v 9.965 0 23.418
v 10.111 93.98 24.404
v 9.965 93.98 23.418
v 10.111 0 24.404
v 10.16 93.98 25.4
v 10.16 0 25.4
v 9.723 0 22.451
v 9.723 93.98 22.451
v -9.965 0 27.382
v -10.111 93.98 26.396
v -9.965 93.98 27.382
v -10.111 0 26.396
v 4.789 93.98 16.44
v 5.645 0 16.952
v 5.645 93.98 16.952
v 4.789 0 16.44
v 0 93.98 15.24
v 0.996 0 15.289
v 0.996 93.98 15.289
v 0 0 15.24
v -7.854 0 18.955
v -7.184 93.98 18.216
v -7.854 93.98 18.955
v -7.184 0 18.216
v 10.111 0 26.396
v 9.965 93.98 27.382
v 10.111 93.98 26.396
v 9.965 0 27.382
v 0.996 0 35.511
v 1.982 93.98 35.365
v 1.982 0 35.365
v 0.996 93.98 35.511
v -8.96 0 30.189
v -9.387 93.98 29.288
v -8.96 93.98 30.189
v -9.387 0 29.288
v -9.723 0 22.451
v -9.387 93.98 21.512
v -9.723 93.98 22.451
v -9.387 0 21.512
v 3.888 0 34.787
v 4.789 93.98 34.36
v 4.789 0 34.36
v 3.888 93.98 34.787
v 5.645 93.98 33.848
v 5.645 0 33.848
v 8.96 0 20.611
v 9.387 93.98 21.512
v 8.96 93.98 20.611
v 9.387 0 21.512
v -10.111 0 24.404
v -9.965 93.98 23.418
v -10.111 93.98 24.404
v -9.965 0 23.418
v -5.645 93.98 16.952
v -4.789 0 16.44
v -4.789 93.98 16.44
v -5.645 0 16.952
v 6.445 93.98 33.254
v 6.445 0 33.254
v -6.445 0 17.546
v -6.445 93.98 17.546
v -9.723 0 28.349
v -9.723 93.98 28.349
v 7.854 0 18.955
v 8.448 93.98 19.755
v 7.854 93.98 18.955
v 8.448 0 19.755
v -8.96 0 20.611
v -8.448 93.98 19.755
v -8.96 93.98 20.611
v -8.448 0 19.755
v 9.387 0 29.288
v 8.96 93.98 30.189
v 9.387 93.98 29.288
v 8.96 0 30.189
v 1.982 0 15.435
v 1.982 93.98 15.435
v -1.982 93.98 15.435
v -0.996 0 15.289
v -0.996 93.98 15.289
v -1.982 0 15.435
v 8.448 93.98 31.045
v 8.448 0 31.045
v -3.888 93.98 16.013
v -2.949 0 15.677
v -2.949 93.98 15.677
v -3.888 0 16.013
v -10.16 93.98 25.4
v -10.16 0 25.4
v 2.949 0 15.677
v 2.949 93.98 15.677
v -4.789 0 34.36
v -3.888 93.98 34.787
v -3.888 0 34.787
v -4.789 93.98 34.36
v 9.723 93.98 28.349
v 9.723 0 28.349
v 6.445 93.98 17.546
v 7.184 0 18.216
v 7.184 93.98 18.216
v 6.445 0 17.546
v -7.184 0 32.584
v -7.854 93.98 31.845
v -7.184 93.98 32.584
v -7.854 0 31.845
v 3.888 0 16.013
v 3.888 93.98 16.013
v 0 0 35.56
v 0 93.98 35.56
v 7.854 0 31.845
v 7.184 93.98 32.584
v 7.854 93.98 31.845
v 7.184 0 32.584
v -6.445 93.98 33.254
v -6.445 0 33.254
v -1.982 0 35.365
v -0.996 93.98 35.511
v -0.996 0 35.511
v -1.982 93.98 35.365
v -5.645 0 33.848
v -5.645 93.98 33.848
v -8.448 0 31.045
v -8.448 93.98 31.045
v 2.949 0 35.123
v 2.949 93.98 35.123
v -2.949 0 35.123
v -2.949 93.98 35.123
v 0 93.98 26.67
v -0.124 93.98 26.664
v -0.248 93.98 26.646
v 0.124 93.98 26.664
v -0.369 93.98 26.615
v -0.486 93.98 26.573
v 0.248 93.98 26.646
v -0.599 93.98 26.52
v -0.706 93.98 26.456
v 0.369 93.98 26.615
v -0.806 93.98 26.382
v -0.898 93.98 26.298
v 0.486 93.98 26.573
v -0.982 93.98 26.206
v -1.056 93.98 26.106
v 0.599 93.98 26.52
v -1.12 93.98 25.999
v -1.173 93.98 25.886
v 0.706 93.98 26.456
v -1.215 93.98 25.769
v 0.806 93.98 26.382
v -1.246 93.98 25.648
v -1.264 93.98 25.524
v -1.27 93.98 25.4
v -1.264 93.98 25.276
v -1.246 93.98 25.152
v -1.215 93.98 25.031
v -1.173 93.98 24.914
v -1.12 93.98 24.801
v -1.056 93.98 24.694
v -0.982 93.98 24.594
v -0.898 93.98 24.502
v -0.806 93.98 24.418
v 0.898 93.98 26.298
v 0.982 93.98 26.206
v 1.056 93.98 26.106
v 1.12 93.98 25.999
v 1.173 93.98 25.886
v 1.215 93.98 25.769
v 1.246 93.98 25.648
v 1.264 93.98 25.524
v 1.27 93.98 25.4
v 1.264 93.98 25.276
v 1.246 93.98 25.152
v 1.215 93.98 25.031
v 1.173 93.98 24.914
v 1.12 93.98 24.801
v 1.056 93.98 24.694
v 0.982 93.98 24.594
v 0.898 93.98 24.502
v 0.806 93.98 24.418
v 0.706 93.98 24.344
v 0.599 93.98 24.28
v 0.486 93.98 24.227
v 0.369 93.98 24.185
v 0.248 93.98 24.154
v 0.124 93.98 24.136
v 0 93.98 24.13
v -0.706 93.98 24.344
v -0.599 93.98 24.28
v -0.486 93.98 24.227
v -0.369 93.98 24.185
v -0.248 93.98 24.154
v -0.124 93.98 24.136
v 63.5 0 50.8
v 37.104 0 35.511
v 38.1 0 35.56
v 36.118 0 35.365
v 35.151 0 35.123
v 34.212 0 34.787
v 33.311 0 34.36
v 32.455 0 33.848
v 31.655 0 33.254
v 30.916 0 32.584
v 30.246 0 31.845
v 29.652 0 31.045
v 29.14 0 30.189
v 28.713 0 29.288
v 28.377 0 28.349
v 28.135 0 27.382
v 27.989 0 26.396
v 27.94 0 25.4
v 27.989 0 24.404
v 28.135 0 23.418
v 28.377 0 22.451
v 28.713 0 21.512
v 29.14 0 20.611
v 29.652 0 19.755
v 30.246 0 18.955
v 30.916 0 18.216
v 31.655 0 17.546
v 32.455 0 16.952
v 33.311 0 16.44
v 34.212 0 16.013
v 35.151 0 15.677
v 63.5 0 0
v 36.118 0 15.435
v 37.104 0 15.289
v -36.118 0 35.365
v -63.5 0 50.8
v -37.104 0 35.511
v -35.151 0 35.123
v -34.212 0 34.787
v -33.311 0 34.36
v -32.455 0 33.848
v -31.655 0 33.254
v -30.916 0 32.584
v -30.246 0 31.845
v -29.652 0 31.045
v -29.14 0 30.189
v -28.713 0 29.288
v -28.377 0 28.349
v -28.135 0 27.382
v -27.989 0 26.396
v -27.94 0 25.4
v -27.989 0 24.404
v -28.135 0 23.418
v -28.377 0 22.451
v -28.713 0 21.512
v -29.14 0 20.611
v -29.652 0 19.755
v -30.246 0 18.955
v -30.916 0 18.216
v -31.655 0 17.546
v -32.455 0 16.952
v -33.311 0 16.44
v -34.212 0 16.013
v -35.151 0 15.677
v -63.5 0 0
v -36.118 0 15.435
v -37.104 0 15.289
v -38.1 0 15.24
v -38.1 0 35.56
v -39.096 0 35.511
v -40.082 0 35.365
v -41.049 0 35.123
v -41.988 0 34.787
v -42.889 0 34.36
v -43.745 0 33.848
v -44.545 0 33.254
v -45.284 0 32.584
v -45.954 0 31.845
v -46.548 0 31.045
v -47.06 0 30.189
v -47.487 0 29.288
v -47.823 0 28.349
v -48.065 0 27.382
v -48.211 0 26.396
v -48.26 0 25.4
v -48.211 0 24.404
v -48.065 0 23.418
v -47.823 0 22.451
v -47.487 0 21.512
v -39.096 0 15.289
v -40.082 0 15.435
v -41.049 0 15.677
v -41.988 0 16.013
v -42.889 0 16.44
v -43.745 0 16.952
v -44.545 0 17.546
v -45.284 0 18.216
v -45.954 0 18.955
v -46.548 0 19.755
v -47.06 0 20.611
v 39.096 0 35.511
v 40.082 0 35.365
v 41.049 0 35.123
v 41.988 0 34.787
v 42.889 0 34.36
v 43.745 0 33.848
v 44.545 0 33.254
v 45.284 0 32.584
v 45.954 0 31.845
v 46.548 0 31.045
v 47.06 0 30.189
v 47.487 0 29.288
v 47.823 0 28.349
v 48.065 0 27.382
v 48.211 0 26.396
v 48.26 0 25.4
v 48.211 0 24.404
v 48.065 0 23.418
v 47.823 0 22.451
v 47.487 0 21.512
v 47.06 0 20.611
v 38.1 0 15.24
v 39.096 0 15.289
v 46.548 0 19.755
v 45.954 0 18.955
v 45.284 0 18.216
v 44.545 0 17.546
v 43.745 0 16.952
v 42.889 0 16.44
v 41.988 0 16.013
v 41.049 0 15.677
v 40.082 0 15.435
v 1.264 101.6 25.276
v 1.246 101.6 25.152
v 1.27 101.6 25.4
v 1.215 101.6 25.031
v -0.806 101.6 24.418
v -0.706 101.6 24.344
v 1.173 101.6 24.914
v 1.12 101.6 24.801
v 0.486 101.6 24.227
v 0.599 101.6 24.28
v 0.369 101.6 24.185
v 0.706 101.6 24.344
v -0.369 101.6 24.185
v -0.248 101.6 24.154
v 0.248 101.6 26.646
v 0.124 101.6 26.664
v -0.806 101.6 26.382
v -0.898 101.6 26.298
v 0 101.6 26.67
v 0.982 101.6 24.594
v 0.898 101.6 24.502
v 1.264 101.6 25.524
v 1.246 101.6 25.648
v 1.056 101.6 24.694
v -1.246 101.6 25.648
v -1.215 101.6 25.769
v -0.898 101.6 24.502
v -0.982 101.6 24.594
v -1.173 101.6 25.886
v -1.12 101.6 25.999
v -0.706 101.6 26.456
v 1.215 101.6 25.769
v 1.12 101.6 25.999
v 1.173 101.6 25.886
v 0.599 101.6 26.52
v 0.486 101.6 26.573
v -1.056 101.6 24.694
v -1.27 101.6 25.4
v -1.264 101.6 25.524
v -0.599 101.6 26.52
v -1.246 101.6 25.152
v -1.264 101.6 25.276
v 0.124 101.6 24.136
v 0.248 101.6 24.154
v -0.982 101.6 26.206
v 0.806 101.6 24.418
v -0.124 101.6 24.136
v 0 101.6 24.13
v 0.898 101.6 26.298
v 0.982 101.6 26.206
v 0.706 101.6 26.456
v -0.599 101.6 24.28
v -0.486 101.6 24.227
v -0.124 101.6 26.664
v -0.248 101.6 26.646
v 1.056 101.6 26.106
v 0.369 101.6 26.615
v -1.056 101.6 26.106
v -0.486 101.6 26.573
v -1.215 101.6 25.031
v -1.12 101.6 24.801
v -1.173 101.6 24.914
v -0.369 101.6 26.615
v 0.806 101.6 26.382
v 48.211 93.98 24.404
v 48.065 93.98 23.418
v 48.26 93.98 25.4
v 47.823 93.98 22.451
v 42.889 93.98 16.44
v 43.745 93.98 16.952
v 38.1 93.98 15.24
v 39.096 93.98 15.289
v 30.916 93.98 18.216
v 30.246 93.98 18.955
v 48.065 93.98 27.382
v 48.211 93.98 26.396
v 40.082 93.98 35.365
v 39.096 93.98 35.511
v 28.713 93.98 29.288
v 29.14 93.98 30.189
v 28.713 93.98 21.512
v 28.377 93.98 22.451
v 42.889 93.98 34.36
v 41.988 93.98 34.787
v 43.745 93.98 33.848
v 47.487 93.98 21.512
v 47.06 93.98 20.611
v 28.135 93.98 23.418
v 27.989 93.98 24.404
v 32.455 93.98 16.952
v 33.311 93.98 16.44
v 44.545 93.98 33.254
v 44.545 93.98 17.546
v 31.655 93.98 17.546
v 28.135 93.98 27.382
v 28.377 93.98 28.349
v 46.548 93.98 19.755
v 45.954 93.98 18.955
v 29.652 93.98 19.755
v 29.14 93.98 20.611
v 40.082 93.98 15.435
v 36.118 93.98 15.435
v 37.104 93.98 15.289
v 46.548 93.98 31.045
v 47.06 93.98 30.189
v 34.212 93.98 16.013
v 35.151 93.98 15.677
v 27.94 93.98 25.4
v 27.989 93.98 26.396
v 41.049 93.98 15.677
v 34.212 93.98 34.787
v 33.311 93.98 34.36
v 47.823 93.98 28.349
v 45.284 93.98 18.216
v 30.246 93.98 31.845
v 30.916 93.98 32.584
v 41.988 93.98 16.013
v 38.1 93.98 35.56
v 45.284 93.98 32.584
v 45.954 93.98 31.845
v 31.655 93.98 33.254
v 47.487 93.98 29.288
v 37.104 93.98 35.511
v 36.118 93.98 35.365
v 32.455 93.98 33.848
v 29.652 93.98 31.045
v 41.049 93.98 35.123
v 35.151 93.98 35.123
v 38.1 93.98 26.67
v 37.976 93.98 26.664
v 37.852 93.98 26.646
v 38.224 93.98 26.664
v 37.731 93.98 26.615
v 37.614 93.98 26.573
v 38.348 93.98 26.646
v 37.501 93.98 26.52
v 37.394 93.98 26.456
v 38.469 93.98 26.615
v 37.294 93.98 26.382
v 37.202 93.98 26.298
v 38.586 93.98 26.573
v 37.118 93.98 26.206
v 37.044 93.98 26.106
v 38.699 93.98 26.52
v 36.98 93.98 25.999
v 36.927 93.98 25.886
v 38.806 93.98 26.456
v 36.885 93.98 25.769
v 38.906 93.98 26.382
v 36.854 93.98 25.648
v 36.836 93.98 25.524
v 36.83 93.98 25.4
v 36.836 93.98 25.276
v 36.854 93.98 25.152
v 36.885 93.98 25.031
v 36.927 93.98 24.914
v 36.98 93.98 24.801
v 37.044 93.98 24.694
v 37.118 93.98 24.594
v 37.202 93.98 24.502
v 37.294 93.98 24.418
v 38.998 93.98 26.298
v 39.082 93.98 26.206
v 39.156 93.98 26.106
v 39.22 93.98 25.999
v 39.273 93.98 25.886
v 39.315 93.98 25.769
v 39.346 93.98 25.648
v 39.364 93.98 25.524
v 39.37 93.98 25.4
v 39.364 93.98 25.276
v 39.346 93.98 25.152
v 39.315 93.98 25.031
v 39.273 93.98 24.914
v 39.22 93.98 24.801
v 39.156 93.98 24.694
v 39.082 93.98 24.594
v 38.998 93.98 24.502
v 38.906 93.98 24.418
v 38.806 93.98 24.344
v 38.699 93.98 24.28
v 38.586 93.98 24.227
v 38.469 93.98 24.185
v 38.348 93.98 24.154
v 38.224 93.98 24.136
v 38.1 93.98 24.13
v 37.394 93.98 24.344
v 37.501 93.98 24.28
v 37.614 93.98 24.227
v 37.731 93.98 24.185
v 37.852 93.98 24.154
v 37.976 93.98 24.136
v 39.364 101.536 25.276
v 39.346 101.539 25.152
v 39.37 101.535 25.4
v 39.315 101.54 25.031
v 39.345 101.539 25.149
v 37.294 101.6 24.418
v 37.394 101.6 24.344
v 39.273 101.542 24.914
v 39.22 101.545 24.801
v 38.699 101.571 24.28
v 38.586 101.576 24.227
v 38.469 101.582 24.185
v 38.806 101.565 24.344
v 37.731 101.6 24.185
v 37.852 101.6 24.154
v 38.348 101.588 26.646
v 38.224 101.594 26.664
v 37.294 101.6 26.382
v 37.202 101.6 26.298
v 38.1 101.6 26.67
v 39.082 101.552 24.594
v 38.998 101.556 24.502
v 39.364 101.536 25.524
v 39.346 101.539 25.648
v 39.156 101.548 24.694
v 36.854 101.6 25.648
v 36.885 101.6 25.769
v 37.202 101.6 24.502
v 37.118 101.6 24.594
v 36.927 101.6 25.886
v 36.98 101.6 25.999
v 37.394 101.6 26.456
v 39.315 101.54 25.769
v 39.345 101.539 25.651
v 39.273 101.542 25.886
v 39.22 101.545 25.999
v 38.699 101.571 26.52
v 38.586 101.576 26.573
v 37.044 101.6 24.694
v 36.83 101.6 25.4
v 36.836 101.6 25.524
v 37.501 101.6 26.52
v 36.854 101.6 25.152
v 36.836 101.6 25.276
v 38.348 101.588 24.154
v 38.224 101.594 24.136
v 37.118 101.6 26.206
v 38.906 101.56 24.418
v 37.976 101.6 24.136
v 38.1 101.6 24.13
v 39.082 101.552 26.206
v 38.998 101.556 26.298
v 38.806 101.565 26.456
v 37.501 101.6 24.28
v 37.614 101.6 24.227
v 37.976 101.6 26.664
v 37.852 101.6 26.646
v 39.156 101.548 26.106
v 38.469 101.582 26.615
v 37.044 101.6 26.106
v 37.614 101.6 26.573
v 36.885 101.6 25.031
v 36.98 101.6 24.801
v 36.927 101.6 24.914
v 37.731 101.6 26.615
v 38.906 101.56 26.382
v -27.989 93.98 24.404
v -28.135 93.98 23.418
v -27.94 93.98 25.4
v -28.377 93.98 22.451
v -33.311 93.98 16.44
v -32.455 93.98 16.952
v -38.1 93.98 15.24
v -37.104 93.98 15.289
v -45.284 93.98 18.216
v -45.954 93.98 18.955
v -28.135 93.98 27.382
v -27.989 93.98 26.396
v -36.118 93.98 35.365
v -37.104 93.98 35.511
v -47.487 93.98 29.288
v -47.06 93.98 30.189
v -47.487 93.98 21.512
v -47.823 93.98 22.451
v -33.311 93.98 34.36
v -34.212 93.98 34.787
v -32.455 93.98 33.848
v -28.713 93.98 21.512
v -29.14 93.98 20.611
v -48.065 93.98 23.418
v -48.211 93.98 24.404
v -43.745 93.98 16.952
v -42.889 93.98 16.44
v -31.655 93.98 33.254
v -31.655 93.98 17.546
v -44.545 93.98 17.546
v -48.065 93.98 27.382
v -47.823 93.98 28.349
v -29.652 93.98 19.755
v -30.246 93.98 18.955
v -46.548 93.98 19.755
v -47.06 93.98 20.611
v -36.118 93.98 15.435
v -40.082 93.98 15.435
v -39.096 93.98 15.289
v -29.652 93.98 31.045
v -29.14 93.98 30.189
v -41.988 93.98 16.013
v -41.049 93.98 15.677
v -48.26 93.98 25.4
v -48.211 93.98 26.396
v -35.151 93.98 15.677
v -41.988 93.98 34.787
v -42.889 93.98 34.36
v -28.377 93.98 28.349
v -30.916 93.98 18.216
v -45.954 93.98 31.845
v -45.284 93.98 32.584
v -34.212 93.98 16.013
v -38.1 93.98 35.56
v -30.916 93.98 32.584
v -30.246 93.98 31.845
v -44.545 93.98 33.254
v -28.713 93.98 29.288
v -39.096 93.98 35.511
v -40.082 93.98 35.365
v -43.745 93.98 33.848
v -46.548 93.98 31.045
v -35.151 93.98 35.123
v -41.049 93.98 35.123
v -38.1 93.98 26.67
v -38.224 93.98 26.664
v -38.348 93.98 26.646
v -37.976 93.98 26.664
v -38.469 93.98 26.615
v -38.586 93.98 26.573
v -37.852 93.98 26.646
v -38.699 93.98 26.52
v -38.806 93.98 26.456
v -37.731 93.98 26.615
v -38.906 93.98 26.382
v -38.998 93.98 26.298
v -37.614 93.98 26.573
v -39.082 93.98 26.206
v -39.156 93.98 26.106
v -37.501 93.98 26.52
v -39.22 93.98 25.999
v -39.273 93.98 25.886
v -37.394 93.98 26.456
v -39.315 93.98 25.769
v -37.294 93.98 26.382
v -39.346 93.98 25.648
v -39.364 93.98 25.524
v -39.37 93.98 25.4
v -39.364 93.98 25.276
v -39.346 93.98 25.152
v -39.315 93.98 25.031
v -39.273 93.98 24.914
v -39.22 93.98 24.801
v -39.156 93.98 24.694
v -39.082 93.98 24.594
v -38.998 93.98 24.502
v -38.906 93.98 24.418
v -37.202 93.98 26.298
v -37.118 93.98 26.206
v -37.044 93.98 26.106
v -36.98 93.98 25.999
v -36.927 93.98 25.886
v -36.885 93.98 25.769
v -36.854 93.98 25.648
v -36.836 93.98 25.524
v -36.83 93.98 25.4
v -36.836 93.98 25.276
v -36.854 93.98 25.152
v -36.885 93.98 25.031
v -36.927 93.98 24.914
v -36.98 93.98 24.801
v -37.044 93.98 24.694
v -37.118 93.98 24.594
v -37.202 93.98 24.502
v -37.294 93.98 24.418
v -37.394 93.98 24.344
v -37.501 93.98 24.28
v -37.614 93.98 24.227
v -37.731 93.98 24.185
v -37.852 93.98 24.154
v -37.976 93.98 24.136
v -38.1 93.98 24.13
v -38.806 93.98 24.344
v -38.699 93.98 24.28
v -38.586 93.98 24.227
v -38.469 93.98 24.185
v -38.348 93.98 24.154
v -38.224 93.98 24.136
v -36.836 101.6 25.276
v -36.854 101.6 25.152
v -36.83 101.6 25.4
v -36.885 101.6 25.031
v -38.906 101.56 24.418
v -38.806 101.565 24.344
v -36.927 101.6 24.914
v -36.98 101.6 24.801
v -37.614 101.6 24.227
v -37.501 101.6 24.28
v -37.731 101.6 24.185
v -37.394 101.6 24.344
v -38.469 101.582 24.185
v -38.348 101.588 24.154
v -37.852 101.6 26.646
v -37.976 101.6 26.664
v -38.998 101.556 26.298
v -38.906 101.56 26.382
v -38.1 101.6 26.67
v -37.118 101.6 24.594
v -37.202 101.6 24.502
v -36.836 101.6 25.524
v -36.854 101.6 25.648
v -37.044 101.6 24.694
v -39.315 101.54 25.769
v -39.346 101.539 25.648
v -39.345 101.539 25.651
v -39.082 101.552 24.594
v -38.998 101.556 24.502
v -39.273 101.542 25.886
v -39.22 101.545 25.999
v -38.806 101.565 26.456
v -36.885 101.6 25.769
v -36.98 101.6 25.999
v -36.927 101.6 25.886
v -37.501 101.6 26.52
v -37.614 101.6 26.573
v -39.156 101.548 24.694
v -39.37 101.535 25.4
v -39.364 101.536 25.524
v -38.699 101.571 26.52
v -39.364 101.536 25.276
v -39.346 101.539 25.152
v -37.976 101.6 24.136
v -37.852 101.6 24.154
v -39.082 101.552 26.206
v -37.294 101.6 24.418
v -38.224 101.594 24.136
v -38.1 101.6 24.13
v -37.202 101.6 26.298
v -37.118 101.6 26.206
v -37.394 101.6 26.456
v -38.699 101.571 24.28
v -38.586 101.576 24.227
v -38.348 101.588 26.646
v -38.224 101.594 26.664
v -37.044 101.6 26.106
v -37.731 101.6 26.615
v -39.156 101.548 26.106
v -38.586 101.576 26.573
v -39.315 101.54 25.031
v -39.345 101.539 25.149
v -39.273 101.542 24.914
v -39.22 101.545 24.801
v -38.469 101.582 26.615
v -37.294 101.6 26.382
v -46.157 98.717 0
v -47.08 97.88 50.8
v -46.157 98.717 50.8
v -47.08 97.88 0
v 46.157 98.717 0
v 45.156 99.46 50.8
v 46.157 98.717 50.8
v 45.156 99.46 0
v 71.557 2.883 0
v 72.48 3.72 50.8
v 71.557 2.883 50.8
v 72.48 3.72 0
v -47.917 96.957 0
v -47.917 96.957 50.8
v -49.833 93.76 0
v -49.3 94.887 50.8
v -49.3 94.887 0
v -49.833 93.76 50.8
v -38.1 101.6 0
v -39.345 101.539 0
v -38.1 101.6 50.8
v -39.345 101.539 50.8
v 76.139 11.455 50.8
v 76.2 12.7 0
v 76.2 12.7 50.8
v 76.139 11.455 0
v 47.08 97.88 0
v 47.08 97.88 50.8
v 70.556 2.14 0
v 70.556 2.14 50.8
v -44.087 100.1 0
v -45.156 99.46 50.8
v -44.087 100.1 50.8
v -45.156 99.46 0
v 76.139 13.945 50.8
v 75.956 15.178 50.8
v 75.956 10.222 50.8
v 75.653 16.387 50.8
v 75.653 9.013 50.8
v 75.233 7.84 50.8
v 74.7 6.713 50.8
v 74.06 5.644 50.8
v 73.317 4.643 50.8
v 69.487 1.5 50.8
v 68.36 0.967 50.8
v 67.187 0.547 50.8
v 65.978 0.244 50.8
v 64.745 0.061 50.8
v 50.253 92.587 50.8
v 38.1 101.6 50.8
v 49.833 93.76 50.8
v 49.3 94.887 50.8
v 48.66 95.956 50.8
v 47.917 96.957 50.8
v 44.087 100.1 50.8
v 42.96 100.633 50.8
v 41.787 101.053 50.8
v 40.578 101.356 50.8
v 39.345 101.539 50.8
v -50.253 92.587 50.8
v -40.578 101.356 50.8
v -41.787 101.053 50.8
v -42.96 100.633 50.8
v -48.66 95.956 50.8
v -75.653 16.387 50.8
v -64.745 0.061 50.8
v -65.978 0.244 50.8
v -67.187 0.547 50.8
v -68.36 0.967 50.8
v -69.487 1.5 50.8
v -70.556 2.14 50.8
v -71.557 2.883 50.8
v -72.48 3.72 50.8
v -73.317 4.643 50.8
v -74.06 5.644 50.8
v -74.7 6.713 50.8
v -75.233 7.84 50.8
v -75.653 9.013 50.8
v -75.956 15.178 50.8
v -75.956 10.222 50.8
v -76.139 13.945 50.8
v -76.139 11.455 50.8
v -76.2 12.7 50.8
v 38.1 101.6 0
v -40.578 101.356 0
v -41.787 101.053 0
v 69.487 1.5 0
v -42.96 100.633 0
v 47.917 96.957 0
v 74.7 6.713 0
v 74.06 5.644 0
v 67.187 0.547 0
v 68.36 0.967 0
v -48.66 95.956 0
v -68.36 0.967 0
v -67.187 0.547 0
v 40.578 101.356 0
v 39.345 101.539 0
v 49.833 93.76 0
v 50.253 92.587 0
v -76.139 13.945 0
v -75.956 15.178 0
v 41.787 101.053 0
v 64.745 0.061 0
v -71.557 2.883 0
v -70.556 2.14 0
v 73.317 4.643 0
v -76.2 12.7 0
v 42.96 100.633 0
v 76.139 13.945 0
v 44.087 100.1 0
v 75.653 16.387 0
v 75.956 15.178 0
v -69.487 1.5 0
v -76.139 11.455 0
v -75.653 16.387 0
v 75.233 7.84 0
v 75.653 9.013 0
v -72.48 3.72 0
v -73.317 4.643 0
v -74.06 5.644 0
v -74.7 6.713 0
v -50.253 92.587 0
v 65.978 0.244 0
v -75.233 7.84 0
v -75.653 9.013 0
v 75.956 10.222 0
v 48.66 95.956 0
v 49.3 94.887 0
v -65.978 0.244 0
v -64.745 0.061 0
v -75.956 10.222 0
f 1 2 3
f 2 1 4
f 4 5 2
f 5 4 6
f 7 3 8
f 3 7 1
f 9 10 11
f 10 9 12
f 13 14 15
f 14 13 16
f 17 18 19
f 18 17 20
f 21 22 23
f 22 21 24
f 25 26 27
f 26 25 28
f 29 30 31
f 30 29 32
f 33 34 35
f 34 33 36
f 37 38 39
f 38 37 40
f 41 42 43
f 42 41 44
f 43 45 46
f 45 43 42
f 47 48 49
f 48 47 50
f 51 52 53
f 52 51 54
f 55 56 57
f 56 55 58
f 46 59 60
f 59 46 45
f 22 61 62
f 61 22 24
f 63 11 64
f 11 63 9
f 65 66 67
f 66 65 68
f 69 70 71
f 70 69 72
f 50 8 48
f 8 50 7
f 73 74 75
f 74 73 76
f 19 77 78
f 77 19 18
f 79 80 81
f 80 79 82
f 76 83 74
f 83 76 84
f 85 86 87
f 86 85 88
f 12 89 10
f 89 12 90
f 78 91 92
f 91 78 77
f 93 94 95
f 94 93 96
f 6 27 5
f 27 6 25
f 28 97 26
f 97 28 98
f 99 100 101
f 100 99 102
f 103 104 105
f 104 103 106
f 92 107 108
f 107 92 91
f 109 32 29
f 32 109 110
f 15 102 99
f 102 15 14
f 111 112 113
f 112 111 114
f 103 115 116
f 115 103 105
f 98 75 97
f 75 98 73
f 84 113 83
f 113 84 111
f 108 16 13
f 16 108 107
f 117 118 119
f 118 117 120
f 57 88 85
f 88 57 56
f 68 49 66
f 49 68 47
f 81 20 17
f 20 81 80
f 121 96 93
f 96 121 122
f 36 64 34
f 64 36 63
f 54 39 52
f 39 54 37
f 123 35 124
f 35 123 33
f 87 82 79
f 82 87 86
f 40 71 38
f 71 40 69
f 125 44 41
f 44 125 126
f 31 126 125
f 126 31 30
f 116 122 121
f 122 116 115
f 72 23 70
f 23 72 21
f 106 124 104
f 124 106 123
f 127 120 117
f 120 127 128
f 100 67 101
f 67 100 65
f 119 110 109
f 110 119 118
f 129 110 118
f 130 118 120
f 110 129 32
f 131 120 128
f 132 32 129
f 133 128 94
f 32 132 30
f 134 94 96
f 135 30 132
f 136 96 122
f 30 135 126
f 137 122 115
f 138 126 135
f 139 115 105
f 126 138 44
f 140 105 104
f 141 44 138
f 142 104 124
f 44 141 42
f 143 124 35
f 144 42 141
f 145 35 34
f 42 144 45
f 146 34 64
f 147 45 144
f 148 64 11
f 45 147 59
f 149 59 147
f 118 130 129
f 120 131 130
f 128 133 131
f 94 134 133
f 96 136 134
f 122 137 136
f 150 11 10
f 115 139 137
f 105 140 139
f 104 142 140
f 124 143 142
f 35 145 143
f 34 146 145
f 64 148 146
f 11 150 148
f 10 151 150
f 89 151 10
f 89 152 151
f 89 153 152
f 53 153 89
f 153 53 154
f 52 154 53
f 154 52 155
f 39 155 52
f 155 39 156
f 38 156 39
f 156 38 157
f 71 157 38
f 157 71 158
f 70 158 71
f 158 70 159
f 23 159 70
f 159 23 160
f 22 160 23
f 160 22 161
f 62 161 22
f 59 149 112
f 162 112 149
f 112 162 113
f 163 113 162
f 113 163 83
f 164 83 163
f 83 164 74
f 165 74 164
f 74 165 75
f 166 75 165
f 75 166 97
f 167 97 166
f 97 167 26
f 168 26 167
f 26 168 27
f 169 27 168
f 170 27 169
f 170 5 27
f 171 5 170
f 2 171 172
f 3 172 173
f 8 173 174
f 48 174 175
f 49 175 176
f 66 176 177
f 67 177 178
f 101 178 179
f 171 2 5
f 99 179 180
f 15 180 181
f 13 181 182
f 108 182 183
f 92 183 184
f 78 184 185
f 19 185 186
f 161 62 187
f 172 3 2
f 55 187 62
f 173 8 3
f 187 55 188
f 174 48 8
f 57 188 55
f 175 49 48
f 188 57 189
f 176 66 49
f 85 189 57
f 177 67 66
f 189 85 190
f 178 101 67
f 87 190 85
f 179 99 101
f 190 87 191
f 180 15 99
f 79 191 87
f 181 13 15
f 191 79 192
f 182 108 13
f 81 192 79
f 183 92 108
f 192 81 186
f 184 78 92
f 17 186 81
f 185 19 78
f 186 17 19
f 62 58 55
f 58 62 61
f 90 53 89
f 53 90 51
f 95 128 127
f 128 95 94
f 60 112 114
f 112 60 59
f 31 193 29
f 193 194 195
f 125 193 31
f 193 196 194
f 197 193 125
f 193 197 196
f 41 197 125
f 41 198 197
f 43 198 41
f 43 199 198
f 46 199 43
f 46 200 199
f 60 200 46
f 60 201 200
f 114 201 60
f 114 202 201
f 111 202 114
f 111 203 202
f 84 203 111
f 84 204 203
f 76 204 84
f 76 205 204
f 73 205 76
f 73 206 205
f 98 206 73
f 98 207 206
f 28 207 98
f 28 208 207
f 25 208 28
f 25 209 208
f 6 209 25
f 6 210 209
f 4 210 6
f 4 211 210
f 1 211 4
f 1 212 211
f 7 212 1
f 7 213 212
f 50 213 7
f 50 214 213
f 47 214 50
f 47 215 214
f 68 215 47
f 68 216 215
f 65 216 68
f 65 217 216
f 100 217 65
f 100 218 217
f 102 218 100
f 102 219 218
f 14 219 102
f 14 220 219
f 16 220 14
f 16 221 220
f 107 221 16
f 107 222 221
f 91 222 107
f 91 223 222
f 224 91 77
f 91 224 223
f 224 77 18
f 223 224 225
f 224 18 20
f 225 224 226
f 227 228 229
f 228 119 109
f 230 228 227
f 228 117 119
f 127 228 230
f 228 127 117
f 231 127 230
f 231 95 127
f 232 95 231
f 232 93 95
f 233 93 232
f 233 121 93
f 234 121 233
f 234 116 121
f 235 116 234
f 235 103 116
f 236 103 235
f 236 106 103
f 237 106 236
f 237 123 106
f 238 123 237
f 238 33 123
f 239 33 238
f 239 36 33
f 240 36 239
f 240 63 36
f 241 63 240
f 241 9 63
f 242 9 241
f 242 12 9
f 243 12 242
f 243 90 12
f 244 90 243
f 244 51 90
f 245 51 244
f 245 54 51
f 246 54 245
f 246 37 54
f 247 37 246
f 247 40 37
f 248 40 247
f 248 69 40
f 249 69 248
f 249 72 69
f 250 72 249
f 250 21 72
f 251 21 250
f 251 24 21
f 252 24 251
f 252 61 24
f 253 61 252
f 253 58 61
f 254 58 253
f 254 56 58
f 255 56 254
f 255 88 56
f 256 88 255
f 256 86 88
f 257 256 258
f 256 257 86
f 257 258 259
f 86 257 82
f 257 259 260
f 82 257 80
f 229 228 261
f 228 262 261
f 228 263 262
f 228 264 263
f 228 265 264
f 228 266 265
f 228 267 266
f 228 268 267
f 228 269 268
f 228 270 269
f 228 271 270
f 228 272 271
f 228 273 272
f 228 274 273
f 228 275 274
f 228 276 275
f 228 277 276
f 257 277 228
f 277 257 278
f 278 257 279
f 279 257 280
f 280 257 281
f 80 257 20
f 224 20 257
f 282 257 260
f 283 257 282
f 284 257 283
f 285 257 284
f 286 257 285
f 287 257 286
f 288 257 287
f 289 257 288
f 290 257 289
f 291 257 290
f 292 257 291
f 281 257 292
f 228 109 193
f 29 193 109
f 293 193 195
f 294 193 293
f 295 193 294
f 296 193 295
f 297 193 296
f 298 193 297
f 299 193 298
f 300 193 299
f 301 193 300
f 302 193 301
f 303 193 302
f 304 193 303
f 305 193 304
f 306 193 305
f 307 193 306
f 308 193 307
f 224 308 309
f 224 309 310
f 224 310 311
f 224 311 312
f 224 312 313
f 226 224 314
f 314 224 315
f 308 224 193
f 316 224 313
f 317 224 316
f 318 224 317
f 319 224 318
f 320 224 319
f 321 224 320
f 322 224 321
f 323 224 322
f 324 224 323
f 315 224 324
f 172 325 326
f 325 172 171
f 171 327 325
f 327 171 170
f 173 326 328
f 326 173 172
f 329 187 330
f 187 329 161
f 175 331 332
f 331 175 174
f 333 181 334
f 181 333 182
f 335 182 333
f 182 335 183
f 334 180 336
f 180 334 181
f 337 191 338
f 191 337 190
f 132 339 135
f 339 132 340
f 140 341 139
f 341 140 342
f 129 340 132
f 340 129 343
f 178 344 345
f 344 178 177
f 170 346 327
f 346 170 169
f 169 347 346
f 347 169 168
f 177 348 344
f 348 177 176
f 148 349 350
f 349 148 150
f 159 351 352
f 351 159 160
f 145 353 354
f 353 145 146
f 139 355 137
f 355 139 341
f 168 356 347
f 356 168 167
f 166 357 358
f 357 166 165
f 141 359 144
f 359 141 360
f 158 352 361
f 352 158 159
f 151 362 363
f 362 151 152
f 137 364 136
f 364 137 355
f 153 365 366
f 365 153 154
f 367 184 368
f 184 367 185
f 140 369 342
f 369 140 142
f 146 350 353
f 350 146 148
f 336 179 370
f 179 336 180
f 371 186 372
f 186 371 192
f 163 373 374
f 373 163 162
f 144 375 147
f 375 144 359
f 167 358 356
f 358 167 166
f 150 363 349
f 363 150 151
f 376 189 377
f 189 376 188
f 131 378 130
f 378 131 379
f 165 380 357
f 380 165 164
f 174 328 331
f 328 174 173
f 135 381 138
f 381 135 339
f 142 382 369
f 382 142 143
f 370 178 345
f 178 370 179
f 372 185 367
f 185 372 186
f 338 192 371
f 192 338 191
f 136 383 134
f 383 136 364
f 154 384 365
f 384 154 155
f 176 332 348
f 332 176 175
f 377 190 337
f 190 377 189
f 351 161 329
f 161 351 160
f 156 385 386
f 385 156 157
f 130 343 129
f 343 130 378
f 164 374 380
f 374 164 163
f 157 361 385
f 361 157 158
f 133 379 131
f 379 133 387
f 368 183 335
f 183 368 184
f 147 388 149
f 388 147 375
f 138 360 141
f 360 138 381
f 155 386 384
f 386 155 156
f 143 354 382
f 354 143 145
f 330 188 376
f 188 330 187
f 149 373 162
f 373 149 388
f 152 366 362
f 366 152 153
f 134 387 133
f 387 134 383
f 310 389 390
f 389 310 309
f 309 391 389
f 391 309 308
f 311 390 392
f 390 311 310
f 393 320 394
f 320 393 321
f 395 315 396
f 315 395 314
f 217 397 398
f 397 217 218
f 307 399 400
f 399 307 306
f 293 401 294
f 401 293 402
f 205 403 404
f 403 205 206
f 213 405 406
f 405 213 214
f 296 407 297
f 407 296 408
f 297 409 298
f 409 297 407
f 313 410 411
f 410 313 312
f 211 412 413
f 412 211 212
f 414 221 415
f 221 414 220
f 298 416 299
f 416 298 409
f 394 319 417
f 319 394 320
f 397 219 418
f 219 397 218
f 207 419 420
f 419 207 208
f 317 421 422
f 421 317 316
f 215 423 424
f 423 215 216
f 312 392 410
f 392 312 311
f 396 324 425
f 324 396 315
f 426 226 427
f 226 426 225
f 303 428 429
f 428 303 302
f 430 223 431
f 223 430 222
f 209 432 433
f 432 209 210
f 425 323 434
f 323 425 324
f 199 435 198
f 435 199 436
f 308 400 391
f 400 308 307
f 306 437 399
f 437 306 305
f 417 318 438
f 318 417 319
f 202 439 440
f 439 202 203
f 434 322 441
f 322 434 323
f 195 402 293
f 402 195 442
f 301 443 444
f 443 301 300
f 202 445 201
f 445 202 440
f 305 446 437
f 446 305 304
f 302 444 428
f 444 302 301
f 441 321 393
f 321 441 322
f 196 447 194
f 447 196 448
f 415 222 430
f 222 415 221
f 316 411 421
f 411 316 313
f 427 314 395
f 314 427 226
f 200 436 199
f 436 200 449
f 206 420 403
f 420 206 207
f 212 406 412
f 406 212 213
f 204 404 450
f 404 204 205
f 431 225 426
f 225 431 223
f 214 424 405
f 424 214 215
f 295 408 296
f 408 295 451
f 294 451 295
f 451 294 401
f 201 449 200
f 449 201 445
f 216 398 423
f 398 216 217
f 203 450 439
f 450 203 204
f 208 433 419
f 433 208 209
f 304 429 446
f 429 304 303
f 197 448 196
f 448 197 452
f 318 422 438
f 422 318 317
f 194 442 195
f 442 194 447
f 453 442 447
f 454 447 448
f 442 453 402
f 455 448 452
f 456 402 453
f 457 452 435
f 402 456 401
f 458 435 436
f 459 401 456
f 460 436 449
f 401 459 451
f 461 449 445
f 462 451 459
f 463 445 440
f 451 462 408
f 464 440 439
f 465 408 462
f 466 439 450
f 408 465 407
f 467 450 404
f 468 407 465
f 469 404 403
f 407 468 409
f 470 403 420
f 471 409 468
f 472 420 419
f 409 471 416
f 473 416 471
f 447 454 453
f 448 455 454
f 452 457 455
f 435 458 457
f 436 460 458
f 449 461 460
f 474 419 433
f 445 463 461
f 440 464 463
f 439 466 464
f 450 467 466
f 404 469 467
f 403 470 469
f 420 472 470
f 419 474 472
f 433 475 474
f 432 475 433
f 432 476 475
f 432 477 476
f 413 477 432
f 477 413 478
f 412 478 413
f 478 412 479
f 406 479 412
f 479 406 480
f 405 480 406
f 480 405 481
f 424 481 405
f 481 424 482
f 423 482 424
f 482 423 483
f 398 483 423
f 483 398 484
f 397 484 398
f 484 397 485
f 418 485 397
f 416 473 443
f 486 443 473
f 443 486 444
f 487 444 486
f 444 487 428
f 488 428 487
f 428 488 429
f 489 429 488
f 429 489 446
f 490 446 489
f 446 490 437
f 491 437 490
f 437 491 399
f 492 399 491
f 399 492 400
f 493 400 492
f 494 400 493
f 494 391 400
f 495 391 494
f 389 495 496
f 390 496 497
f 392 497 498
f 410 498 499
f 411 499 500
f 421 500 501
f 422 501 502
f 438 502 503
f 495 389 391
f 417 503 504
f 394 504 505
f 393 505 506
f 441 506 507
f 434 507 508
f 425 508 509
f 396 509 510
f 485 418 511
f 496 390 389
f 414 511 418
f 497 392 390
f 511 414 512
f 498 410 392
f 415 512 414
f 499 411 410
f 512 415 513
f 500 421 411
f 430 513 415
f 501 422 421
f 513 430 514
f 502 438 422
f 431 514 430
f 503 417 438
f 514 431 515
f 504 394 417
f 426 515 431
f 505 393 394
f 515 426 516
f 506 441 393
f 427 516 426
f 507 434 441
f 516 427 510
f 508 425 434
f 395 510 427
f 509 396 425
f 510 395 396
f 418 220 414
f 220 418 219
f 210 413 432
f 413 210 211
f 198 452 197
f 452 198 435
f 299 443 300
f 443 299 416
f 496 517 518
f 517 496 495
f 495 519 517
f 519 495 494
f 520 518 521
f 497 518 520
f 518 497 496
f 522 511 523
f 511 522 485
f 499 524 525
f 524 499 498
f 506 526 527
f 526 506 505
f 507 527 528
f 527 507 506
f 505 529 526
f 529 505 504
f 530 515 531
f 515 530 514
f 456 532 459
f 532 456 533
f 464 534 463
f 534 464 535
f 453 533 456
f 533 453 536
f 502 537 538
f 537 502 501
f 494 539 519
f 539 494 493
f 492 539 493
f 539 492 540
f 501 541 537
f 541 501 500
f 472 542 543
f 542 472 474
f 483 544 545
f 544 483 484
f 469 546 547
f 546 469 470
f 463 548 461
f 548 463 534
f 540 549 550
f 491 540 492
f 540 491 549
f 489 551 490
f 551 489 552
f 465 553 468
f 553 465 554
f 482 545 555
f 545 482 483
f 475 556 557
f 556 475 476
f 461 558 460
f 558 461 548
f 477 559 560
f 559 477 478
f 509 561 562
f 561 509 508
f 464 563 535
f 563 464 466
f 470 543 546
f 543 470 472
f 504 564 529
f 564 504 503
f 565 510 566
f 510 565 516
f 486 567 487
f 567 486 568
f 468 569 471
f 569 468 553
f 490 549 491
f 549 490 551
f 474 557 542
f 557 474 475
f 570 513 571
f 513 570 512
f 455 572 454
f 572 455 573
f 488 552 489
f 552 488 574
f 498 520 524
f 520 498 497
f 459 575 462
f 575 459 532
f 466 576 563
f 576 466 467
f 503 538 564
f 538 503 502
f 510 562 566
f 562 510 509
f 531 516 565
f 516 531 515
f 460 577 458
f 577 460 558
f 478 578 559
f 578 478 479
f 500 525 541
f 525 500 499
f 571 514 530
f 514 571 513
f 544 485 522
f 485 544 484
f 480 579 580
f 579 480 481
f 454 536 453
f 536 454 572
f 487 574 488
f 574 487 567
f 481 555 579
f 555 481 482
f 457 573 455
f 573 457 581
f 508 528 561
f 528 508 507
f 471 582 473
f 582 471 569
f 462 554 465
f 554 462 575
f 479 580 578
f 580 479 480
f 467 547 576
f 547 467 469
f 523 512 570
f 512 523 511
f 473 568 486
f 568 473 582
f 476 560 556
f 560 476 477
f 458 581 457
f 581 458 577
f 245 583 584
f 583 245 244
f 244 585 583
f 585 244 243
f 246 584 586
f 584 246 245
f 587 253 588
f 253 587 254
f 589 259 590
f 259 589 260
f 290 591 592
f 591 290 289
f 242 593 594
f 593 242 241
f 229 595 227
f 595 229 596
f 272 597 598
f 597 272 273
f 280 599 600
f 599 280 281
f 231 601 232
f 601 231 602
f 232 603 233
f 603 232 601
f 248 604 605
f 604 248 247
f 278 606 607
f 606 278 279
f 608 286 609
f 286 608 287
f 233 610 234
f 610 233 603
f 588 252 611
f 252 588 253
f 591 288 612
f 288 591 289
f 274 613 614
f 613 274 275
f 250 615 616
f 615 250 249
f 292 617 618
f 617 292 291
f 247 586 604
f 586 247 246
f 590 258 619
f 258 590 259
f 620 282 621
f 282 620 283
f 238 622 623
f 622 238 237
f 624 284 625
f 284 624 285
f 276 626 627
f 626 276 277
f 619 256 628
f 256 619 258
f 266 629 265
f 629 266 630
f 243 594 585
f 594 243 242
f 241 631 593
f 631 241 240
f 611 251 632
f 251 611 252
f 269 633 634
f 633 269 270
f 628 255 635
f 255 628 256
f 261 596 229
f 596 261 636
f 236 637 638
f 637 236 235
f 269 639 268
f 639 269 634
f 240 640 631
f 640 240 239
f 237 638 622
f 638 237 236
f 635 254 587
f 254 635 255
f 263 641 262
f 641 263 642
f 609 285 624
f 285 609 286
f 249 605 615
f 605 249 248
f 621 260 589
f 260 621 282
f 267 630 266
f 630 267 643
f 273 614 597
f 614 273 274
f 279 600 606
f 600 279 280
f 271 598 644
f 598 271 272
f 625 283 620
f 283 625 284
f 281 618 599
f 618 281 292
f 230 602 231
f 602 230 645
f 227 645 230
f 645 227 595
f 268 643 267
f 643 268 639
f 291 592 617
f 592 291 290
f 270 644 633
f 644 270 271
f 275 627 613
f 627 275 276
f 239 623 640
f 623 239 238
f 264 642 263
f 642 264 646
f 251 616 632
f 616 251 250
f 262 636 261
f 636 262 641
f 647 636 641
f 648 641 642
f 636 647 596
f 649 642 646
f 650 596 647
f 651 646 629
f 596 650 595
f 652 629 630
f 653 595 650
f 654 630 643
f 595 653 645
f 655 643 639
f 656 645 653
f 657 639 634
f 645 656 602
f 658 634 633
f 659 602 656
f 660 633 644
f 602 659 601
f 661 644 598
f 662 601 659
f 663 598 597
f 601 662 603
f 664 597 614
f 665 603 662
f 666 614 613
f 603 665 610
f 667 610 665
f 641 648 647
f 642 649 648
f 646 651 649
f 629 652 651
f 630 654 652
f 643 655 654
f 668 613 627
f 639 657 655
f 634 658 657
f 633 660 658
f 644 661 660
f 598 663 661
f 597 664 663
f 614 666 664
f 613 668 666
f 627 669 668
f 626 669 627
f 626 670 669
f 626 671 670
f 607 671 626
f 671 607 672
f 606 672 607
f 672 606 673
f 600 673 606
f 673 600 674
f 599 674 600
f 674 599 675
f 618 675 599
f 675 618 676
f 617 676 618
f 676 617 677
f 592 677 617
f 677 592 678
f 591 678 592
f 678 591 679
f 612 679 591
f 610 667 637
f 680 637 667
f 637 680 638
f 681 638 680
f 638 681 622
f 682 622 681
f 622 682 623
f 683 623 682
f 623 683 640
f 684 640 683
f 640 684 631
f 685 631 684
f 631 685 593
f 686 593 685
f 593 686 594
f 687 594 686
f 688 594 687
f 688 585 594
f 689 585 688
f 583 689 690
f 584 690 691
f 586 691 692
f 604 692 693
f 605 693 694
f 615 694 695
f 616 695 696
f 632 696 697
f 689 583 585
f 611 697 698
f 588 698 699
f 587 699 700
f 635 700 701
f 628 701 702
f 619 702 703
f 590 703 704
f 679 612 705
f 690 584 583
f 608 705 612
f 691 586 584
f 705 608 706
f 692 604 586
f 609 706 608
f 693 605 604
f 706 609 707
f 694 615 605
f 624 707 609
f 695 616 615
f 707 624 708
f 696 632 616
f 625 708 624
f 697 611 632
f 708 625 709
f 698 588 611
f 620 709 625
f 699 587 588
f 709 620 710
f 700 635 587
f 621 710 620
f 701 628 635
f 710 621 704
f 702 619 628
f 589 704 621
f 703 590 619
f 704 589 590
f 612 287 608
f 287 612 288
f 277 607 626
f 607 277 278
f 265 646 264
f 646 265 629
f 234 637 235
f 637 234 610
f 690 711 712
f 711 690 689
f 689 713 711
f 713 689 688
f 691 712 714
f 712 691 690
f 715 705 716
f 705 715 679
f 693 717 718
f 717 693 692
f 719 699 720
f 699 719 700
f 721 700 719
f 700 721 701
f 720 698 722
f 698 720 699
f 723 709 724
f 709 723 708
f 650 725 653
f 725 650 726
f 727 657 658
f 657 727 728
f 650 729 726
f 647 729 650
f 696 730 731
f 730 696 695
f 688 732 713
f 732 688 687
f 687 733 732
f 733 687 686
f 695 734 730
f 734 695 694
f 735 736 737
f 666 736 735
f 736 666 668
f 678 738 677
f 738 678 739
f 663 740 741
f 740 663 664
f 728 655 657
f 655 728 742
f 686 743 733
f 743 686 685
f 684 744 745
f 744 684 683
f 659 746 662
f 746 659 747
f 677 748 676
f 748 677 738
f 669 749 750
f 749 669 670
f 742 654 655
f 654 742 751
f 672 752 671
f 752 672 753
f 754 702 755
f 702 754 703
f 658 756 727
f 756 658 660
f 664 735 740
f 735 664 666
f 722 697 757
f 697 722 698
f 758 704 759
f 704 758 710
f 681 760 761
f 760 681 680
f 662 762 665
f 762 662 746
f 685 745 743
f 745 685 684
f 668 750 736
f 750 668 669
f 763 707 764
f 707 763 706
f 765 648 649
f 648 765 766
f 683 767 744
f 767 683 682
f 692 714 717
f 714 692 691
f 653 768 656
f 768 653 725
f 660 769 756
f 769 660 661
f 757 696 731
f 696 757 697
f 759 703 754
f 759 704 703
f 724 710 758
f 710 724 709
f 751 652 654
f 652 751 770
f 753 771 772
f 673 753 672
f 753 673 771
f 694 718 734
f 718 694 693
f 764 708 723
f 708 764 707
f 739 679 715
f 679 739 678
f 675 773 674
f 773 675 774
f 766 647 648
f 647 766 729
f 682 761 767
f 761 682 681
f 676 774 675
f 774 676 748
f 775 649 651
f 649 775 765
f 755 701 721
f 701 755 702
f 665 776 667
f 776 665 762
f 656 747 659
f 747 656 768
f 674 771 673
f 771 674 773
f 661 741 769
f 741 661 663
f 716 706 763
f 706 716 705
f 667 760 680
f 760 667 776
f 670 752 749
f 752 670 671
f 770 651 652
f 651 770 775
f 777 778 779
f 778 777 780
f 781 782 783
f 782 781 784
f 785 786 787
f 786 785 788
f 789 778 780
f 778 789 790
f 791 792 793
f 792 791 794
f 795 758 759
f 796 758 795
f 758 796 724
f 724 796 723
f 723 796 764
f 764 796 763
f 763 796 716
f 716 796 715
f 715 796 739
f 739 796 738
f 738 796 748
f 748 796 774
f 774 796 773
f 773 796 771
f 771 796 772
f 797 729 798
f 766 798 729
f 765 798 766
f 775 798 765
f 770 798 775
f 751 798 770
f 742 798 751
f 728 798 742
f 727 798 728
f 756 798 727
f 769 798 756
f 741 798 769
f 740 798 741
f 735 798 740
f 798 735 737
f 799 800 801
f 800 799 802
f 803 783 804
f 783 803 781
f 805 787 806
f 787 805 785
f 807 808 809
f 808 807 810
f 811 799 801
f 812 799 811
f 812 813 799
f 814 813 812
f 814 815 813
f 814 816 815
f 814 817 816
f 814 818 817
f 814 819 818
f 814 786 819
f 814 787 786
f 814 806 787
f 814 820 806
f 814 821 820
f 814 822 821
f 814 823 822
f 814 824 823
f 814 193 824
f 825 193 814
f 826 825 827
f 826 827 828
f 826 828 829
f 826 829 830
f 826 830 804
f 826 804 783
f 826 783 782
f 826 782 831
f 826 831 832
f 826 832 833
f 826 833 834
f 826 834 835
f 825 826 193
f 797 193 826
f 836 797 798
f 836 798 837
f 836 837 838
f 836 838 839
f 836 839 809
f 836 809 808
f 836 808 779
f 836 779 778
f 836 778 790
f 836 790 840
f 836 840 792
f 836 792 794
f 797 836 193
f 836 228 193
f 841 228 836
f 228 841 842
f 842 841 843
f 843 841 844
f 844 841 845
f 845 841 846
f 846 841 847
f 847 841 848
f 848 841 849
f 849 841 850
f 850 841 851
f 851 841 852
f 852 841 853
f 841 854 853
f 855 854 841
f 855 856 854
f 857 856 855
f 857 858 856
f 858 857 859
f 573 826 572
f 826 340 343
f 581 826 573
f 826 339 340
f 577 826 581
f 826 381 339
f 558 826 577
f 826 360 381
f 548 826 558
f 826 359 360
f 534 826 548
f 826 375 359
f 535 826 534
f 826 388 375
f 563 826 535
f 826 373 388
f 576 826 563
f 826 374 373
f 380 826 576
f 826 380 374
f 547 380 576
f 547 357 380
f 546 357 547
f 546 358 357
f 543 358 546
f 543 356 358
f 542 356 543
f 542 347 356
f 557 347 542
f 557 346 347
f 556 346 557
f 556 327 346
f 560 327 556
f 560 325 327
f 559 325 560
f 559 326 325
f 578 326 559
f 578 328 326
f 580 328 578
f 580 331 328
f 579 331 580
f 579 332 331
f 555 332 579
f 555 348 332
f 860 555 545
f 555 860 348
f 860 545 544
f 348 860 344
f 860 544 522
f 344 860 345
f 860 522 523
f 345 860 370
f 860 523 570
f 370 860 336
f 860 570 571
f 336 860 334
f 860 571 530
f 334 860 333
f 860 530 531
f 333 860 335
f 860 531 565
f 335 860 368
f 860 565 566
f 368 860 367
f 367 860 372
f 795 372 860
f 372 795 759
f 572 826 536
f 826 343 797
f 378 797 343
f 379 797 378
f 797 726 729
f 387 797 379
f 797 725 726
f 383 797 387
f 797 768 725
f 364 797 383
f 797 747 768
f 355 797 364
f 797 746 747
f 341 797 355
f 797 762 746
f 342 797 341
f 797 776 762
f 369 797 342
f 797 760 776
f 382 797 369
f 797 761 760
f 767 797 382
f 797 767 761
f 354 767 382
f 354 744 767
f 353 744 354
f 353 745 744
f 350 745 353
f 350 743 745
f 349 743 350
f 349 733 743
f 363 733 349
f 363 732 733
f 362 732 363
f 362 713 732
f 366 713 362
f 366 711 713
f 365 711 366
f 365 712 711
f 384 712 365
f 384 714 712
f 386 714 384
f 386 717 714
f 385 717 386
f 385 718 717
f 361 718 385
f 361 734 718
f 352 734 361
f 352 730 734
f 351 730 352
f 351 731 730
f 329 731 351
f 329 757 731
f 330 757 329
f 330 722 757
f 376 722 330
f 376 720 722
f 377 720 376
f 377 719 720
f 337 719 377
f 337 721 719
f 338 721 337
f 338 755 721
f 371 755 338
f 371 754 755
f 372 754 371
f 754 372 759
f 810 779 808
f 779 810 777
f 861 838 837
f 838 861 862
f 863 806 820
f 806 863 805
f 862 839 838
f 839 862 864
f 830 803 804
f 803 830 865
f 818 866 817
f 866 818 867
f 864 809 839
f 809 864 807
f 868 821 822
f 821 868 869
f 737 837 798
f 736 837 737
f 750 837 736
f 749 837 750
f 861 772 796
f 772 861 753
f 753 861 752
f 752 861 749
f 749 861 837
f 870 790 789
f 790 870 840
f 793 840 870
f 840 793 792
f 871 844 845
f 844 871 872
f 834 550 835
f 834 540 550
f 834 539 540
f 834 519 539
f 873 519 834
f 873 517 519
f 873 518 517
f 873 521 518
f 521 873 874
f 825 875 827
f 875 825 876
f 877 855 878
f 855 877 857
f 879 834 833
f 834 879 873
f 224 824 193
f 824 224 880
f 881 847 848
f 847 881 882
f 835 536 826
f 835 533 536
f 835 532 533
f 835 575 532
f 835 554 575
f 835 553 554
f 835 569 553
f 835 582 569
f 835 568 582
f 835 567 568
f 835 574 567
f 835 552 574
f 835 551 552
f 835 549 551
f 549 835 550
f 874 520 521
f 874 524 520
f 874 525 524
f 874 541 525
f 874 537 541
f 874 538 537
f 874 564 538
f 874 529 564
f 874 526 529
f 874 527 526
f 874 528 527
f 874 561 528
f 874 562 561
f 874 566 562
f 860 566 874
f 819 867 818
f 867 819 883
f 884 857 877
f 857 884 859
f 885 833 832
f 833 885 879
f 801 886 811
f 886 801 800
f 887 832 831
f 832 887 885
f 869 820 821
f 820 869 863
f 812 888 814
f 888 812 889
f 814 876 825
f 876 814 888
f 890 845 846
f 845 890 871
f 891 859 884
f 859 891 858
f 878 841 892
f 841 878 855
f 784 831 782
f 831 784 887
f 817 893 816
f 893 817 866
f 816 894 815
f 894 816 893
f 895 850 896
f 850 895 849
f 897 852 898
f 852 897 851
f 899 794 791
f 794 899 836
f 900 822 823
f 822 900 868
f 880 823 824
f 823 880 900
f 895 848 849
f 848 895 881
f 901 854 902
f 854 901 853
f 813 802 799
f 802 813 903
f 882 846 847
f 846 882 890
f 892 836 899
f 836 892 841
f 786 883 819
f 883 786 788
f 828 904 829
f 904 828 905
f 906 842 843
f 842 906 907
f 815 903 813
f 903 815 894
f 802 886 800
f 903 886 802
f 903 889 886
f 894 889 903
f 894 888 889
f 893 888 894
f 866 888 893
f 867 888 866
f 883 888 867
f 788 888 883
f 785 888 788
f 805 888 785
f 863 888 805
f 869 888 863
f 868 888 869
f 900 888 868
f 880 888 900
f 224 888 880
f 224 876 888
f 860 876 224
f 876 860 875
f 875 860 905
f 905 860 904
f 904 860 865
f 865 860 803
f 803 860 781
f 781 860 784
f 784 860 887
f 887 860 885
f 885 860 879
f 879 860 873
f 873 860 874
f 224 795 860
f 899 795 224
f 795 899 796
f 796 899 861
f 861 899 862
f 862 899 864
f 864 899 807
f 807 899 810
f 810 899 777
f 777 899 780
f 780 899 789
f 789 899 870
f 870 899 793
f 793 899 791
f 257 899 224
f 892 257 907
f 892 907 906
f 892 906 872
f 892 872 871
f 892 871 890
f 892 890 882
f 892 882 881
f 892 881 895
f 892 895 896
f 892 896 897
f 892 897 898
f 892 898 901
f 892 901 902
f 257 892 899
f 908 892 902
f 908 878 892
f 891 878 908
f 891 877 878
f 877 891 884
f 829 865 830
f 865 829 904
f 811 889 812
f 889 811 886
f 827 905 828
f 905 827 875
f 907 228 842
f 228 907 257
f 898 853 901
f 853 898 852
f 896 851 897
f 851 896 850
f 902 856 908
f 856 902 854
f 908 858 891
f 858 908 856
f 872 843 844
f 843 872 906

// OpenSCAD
// foot for new pink couch! ~H 2018-02-19
// h=4
// 1/2b = 3
// 1/2w = 2


$fn=64;
x = 25.4;

difference() {

linear_extrude(height=2*x) {
minkowski() {
    polygon([
        [-1.5*x, 3.5*x],
        [1.5*x, 3.5*x],
        [2.5*x, .5*x],
        [-2.5*x, .5*x]
        ]);


    circle(r=.5*x);
};
};
 pilot_hole();
translate([1.5*x, 0,0])
pilot_hole();
translate([-1.5*x, 0,0])
pilot_hole();
};

module pilot_hole() {

translate([0,0,x])
rotate([-90,0,0])
cylinder(r=.4*x, h=x*3.7);

translate([0,0,x])
rotate([-90,0,0])
cylinder(r=.05*x, h=4*x);
}
